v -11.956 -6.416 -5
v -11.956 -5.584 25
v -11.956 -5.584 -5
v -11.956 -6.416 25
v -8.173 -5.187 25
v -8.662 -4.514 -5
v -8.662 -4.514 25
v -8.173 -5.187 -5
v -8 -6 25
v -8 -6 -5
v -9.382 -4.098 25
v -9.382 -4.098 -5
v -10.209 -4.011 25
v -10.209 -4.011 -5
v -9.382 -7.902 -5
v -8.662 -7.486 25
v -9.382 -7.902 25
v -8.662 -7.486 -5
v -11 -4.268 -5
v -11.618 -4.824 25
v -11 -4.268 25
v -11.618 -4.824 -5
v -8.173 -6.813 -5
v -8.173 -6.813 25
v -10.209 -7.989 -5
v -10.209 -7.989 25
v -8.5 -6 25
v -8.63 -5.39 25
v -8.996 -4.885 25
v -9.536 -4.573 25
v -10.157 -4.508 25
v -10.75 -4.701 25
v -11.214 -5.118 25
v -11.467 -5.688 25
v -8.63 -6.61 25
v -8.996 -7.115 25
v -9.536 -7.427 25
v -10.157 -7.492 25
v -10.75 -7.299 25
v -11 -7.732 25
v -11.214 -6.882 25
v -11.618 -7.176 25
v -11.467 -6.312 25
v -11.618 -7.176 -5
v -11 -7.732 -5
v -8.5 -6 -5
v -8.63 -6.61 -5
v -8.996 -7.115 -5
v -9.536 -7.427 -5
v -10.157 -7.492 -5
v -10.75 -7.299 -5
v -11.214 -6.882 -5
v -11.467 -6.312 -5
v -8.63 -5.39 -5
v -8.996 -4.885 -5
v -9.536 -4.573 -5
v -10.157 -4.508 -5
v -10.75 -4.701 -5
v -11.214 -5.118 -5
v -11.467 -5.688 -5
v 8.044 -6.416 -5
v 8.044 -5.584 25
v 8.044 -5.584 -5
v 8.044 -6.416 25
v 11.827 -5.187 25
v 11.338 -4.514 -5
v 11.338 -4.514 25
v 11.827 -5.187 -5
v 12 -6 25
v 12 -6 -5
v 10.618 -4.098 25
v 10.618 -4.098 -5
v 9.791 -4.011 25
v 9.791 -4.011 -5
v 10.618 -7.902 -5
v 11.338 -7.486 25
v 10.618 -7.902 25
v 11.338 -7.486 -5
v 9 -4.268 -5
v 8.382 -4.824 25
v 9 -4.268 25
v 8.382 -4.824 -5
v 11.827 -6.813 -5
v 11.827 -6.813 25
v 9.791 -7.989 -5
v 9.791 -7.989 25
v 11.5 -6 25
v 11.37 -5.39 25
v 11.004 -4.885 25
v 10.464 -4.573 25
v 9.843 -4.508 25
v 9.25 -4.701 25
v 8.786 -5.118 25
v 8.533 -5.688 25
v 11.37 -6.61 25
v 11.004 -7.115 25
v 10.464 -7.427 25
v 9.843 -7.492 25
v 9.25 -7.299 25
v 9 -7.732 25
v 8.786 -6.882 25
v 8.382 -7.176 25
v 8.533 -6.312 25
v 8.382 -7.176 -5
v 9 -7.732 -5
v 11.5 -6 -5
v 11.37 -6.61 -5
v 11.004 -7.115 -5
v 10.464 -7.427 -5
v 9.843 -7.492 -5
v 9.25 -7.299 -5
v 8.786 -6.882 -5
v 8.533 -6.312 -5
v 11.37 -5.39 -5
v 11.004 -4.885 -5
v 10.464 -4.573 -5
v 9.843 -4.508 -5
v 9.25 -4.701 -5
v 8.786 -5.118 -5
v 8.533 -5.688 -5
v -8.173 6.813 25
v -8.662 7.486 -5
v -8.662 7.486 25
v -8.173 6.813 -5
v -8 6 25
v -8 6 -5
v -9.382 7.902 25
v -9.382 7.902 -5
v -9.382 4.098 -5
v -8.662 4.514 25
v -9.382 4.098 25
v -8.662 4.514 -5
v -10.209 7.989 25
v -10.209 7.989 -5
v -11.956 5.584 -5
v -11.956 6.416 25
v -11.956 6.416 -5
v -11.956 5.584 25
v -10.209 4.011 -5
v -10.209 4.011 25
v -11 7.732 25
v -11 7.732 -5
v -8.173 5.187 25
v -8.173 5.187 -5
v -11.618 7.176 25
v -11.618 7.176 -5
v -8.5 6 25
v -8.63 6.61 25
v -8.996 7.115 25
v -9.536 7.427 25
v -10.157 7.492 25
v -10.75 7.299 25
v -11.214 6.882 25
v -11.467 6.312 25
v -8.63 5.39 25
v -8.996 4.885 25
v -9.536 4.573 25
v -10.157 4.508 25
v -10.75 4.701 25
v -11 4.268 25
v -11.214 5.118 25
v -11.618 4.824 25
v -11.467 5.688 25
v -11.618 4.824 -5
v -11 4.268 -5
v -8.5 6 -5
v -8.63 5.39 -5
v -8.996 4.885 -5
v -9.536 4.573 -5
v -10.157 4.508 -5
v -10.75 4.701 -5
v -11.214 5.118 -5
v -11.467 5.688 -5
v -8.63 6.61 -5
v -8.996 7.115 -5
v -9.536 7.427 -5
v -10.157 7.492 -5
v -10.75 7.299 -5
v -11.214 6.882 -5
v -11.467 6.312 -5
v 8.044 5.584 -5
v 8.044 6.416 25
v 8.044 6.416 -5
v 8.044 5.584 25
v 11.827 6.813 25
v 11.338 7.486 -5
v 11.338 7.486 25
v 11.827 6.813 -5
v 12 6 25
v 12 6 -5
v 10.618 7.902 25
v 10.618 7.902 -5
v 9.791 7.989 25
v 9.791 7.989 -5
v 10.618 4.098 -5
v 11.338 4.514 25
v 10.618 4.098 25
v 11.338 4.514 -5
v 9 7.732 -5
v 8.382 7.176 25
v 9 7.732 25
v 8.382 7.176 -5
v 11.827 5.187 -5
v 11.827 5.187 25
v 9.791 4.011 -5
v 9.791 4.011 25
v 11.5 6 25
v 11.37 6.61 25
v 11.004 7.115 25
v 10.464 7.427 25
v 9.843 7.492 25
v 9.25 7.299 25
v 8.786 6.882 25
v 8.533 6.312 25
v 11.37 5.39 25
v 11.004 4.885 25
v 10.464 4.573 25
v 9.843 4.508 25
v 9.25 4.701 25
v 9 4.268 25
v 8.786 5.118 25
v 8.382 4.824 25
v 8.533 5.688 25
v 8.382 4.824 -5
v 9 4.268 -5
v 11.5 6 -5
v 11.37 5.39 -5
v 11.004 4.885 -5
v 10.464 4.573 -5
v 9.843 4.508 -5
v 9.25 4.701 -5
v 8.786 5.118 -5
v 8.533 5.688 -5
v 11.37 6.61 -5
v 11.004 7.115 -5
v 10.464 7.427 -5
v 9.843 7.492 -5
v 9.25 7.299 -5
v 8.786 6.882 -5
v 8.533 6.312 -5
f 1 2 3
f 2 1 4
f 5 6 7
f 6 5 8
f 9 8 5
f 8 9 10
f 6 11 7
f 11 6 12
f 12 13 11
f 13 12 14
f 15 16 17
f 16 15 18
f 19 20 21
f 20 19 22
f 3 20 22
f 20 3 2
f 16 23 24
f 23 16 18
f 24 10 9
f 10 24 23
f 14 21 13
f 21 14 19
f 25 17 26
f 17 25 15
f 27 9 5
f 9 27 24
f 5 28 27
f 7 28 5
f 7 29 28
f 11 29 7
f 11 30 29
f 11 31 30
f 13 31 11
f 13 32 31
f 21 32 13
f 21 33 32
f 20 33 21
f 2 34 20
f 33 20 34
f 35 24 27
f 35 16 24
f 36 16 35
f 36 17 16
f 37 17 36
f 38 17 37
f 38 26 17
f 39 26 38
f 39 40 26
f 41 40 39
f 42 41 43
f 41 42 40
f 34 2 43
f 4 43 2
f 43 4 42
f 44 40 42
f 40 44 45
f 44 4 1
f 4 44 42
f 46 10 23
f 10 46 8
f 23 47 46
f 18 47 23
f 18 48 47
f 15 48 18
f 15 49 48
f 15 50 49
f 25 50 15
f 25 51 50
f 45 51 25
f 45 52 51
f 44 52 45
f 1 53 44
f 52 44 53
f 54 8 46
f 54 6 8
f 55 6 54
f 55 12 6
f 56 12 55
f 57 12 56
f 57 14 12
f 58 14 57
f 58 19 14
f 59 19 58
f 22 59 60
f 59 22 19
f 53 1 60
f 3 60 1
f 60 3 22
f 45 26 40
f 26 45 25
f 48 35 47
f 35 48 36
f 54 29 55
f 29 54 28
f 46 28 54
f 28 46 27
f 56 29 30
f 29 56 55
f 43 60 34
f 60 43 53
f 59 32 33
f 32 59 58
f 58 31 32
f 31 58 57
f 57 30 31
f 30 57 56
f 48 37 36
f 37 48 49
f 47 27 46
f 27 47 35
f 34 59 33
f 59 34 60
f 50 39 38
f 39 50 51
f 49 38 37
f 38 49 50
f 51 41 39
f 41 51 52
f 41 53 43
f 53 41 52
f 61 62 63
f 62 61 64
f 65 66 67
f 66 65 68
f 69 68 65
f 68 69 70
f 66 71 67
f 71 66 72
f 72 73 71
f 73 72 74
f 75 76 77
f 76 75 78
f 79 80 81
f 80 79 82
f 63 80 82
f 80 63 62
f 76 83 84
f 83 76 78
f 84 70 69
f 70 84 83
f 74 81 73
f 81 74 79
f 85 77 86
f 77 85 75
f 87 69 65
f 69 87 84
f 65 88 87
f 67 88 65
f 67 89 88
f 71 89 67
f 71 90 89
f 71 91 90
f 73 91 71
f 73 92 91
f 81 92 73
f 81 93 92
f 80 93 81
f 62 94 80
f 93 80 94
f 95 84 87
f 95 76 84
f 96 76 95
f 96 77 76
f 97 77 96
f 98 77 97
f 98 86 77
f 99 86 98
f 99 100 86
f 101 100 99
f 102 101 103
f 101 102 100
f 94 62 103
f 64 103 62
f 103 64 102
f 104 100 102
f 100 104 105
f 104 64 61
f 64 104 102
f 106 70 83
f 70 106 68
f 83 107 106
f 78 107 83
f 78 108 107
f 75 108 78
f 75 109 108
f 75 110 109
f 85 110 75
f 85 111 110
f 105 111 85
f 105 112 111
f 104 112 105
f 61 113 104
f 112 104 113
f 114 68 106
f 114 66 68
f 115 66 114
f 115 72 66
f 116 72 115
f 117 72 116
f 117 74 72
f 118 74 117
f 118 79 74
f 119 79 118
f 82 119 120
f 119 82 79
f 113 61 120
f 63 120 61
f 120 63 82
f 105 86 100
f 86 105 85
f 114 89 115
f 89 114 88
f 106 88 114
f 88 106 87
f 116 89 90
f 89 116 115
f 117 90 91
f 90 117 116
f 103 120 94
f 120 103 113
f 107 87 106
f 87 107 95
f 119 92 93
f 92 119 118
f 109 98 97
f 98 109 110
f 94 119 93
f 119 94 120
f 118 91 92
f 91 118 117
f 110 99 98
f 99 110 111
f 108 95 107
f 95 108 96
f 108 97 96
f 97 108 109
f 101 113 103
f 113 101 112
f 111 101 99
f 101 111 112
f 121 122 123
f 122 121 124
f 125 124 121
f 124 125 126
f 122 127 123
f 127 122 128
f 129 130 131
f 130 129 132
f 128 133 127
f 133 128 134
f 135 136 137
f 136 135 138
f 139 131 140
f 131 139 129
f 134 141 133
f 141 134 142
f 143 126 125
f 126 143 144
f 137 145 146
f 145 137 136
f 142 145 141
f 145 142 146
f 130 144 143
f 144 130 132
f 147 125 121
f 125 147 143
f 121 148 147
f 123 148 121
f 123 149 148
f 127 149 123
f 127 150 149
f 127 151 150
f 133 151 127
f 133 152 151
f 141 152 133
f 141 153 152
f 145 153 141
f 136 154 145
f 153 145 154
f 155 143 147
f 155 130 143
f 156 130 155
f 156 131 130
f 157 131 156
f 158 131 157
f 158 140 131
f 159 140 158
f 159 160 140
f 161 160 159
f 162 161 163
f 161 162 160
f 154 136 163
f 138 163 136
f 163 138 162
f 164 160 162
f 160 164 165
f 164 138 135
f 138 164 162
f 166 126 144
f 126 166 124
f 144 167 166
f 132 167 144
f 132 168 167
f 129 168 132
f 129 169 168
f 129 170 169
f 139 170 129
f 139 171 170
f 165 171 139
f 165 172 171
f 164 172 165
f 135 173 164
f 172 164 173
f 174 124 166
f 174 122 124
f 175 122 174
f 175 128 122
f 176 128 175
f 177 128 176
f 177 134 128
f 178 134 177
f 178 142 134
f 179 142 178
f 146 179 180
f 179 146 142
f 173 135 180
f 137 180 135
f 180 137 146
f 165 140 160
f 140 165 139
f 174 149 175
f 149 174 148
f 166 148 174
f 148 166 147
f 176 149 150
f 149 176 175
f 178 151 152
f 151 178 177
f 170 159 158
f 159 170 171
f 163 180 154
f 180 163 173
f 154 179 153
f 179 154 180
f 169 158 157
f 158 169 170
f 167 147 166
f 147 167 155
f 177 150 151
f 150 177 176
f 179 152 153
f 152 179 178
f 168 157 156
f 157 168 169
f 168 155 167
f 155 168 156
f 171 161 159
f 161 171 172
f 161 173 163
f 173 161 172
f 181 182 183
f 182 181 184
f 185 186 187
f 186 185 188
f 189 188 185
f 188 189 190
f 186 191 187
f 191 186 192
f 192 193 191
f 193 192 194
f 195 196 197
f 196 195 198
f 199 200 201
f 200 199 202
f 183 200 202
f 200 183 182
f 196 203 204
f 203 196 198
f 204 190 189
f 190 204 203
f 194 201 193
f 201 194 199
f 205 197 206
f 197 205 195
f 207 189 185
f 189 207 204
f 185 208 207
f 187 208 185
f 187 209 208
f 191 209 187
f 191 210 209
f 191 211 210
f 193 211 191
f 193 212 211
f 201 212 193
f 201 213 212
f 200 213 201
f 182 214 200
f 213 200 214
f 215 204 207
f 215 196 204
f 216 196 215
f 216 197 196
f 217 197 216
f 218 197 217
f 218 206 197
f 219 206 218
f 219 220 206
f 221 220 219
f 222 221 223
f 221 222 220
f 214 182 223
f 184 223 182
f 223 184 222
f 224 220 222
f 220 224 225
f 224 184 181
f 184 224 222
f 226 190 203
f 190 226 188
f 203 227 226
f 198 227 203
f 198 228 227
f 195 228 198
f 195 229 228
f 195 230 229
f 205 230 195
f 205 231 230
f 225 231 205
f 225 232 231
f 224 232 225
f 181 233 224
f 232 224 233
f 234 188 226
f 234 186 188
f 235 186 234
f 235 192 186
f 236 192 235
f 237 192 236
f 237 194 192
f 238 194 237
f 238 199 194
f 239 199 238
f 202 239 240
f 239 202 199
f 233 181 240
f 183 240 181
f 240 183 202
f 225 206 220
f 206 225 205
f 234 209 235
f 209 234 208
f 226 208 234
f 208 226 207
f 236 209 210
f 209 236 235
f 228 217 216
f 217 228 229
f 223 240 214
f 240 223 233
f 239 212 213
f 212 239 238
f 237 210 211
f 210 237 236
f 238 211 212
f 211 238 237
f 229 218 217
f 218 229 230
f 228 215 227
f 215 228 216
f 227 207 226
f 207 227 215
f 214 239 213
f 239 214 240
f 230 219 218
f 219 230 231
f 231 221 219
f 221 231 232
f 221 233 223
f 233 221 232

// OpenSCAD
module cilindro(){
    cylinder(h= 10*3, r=1 ,d = 4, center = true, $fn=15);
}



for (i = [1 : 2])
 {
     difference(){
        translate([-30+(i*20), -6 , 10])
        cilindro();
        translate([-30+(i*20), -6 , 10])
        cylinder(h= 10*5,r=1, d = 3, center = true, $fn=15);
     }
 }   

for (i = [1 : 2]){
    
    difference(){
         translate([-30+(i*20), 6, 10])
         cilindro();
         translate([-30+(i*20), 6 , 10])
         cylinder(h= 10*5, d =  3, center = true, $fn=15);        
     } 
}
     

 
